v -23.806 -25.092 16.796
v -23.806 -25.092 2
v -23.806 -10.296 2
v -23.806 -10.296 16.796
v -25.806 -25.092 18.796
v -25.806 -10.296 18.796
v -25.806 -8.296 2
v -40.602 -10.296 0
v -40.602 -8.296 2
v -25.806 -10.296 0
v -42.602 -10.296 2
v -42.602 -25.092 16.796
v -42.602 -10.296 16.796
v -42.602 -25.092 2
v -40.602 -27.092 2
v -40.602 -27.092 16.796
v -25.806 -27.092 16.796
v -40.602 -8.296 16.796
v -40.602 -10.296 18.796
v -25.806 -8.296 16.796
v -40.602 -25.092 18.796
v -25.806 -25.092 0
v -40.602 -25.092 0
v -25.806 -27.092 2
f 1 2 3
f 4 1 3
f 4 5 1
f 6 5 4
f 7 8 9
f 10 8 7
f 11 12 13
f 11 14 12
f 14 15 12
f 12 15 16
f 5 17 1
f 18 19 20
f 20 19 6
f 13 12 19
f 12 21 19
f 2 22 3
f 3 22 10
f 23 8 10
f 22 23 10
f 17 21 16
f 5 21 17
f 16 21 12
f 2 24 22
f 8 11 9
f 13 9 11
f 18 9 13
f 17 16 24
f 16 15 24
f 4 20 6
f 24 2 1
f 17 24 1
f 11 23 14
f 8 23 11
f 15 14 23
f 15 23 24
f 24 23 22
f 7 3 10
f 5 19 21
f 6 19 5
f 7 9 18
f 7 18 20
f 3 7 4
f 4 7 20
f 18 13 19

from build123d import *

# Parameters (mm, degrees)
F0_W     = 18.796
F0_H     = 18.796
F1_DEPTH = 18.796
F2_SIZE2 = 2
F2_SIZE  = 2


with BuildPart() as f1:
    # F0 (on Top) → F1 (new body)
    with BuildSketch(Plane.XY):
        with Locations((-33.203556, -17.694149)):
            Rectangle(F0_W, F0_H)
    extrude(amount=F1_DEPTH)

    # F2
    f2_edges = [f1.edges().sort_by_distance(p)[0] for p in [
        (-42.601556, -17.694149, 18.796),
        (-33.203556, -27.092149, 18.796),
        (-42.601556, -27.092149, 9.398),
        (-42.601556, -8.296149, 9.398),
        (-42.601556, -17.694149, 0),
        (-33.203556, -27.092149, 0),
        (-23.805556, -27.092149, 9.398),
        (-33.203556, -8.296149, 18.796),
        (-23.805556, -8.296149, 9.398),
        (-23.805556, -17.694149, 0),
        (-23.805556, -17.694149, 18.796),
        (-33.203556, -8.296149, 0),
    ]]
    chamfer(f2_edges, length=F2_SIZE, length2=F2_SIZE2)


solid = f1.part
